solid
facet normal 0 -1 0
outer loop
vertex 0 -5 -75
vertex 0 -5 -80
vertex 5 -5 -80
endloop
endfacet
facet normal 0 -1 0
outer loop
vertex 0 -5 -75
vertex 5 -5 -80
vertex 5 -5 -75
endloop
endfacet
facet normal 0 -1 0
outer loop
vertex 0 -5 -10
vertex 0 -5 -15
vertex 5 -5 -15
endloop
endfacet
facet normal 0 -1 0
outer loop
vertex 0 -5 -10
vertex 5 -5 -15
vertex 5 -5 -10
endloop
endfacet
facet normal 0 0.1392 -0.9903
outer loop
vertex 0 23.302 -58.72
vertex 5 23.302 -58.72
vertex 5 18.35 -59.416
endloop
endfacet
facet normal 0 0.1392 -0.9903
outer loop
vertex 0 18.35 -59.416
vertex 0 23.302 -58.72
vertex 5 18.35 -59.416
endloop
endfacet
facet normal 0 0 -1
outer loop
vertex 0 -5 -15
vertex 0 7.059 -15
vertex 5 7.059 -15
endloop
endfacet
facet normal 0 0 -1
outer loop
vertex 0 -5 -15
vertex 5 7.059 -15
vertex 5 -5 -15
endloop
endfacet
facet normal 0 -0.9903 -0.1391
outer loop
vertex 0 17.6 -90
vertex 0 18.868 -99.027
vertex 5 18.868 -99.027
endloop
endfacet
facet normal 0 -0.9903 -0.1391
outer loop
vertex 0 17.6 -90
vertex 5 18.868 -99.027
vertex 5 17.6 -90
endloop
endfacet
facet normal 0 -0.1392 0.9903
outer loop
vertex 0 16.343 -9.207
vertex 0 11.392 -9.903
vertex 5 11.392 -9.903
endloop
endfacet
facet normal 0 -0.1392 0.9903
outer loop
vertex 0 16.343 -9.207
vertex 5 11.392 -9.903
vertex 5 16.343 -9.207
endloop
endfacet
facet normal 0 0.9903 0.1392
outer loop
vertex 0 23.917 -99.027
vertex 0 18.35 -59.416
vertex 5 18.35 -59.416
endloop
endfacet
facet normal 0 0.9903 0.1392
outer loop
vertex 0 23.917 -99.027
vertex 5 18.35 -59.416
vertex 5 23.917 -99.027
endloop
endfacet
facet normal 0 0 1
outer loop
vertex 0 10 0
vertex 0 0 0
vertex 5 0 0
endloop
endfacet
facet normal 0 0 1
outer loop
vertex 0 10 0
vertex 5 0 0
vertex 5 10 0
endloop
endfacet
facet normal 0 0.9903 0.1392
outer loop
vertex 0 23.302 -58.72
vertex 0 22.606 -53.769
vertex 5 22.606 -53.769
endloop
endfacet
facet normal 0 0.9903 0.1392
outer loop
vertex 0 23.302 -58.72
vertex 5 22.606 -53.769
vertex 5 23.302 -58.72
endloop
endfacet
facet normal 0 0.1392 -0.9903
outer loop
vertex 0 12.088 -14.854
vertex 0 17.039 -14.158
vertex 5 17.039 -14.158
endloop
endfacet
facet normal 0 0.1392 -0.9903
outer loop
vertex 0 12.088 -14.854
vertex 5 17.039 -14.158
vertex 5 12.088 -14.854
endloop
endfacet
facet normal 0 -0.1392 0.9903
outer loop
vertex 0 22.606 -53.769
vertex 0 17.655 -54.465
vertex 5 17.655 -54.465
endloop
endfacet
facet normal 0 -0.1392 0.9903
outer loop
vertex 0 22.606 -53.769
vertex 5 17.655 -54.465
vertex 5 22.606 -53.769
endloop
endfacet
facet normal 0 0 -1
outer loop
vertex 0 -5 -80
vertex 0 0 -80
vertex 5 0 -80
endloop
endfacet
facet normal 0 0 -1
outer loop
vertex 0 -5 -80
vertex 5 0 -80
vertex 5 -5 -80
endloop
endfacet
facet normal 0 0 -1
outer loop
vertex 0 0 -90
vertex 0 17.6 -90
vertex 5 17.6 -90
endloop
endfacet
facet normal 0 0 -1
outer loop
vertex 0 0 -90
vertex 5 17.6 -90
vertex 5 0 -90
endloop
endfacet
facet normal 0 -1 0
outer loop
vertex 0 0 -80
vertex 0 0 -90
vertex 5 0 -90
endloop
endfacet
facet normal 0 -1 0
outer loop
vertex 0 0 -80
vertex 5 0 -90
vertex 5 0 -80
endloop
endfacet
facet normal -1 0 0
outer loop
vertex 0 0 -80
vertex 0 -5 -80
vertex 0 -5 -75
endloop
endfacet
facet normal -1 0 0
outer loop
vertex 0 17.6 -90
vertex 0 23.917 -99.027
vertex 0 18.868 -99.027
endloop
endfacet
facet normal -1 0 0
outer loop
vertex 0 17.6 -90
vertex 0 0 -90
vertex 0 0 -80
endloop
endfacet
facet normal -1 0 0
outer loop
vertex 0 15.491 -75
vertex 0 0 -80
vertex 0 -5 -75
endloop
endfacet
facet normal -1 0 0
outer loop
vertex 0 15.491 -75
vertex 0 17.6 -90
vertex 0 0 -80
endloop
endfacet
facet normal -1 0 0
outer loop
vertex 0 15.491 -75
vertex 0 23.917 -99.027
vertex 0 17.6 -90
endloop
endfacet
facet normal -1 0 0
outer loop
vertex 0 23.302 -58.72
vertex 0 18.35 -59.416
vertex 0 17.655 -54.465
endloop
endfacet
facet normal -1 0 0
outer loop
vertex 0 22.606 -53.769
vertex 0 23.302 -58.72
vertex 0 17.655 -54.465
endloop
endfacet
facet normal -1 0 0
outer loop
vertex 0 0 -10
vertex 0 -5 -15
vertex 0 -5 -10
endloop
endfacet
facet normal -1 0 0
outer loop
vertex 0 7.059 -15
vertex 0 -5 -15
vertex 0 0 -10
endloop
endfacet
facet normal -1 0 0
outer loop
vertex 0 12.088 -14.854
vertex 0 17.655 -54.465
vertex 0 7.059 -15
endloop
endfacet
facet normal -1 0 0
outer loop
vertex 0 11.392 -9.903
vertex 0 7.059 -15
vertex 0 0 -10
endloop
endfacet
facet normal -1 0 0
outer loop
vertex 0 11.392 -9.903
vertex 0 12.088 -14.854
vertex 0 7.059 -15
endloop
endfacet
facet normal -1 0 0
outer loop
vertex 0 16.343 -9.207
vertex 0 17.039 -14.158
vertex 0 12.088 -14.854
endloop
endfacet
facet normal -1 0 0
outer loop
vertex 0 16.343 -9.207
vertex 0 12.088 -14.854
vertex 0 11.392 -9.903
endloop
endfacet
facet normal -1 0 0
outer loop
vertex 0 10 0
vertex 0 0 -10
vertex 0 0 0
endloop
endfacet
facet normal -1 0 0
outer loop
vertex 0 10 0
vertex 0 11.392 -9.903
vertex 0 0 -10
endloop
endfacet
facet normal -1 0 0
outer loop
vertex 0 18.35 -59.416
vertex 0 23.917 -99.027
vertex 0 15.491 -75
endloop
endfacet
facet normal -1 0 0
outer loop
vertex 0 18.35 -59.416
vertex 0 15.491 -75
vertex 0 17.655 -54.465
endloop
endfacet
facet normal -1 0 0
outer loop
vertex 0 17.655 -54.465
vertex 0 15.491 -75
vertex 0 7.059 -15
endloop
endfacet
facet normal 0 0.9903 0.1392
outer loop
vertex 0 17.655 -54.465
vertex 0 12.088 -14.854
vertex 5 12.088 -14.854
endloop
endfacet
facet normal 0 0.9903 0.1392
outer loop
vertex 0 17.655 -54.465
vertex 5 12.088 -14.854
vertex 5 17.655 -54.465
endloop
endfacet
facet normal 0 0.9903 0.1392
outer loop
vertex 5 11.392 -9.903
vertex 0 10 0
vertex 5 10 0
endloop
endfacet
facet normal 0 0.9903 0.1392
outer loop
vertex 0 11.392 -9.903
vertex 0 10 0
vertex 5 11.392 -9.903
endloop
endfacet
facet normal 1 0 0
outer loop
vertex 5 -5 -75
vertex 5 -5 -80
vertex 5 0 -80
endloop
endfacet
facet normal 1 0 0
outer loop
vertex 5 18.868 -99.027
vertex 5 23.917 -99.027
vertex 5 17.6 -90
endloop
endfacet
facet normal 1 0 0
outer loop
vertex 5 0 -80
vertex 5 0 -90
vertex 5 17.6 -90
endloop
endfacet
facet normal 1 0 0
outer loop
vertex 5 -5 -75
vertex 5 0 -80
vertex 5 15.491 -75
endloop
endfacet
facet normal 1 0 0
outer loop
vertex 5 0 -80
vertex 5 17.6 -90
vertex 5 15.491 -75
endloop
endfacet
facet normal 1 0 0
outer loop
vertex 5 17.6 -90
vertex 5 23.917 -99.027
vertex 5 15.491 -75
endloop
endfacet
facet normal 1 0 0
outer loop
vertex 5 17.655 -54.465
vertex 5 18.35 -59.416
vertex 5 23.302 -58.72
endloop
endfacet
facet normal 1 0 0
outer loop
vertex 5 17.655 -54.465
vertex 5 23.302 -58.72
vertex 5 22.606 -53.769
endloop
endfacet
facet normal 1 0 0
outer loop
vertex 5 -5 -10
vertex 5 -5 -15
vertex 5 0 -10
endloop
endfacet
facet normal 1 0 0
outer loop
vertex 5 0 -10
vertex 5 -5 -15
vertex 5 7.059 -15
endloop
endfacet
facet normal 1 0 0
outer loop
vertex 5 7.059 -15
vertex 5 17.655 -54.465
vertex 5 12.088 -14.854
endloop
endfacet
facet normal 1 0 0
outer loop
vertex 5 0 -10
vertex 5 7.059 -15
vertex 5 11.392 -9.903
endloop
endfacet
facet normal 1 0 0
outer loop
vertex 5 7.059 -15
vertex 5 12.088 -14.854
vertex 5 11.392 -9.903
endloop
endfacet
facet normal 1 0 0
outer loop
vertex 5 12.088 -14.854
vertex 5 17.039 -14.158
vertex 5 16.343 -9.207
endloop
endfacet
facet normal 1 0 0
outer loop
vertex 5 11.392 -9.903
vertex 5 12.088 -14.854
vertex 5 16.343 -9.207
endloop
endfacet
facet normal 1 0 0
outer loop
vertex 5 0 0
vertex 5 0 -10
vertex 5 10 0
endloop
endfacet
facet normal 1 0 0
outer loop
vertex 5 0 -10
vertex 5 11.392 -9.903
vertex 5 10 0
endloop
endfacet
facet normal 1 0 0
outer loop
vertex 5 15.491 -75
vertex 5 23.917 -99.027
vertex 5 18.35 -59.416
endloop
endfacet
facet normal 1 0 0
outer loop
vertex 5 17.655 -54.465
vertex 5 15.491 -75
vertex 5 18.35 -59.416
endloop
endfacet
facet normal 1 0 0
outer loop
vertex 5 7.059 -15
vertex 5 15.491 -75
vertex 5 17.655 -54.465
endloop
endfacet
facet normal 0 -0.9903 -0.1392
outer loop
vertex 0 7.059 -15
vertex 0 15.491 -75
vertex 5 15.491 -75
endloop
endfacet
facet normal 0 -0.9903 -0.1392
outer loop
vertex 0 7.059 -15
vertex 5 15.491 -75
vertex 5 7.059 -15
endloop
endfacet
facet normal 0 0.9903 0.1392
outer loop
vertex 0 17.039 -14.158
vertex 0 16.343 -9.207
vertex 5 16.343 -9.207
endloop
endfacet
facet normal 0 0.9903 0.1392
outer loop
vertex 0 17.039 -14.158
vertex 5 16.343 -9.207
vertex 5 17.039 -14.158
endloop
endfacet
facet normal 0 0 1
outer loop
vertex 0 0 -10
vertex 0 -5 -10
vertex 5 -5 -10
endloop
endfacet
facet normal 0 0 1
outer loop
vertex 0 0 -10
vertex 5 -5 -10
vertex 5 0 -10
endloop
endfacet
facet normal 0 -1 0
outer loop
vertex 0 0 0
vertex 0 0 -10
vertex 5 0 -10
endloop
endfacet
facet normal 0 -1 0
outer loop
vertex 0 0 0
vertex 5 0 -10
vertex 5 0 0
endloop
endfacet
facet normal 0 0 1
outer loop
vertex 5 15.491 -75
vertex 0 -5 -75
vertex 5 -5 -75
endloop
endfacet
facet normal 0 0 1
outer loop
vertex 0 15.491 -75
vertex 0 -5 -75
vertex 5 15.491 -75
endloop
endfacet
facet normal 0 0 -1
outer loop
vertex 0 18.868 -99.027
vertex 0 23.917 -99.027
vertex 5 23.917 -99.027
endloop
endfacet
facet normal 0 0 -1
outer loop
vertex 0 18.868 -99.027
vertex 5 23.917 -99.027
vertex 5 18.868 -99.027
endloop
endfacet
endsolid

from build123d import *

# Parameters (mm, degrees)
BOSS_EXTRUDE1_DEPTH = 5


with BuildPart() as part:
    # Sketch1 → Boss-Extrude1 (new body)
    with BuildSketch(Plane(origin=(0, 0, 0), x_dir=(0, 0, -1), z_dir=(1, 0, 0))):
        Polygon((0, 0), (0, 10), (9.902680687, 11.39173101), (9.206815183, 16.343071353), (14.158155526, 17.038936858), (14.854021031, 12.087596514), (54.464743781, 17.654520553), (53.768878276, 22.605860897), (58.72021862, 23.301726401), (59.416084124, 18.350386058), (99.026806874, 23.917310096), (99.026806874, 18.868172233), (90, 17.599537261), (90, 0), (80, 0), (80, -5), (75, -5), (75, 15.49142474), (15, 7.058974658), (15, -5), (10, -5), (10, 0), align=None)
    extrude(amount=BOSS_EXTRUDE1_DEPTH)


solid = part.part
